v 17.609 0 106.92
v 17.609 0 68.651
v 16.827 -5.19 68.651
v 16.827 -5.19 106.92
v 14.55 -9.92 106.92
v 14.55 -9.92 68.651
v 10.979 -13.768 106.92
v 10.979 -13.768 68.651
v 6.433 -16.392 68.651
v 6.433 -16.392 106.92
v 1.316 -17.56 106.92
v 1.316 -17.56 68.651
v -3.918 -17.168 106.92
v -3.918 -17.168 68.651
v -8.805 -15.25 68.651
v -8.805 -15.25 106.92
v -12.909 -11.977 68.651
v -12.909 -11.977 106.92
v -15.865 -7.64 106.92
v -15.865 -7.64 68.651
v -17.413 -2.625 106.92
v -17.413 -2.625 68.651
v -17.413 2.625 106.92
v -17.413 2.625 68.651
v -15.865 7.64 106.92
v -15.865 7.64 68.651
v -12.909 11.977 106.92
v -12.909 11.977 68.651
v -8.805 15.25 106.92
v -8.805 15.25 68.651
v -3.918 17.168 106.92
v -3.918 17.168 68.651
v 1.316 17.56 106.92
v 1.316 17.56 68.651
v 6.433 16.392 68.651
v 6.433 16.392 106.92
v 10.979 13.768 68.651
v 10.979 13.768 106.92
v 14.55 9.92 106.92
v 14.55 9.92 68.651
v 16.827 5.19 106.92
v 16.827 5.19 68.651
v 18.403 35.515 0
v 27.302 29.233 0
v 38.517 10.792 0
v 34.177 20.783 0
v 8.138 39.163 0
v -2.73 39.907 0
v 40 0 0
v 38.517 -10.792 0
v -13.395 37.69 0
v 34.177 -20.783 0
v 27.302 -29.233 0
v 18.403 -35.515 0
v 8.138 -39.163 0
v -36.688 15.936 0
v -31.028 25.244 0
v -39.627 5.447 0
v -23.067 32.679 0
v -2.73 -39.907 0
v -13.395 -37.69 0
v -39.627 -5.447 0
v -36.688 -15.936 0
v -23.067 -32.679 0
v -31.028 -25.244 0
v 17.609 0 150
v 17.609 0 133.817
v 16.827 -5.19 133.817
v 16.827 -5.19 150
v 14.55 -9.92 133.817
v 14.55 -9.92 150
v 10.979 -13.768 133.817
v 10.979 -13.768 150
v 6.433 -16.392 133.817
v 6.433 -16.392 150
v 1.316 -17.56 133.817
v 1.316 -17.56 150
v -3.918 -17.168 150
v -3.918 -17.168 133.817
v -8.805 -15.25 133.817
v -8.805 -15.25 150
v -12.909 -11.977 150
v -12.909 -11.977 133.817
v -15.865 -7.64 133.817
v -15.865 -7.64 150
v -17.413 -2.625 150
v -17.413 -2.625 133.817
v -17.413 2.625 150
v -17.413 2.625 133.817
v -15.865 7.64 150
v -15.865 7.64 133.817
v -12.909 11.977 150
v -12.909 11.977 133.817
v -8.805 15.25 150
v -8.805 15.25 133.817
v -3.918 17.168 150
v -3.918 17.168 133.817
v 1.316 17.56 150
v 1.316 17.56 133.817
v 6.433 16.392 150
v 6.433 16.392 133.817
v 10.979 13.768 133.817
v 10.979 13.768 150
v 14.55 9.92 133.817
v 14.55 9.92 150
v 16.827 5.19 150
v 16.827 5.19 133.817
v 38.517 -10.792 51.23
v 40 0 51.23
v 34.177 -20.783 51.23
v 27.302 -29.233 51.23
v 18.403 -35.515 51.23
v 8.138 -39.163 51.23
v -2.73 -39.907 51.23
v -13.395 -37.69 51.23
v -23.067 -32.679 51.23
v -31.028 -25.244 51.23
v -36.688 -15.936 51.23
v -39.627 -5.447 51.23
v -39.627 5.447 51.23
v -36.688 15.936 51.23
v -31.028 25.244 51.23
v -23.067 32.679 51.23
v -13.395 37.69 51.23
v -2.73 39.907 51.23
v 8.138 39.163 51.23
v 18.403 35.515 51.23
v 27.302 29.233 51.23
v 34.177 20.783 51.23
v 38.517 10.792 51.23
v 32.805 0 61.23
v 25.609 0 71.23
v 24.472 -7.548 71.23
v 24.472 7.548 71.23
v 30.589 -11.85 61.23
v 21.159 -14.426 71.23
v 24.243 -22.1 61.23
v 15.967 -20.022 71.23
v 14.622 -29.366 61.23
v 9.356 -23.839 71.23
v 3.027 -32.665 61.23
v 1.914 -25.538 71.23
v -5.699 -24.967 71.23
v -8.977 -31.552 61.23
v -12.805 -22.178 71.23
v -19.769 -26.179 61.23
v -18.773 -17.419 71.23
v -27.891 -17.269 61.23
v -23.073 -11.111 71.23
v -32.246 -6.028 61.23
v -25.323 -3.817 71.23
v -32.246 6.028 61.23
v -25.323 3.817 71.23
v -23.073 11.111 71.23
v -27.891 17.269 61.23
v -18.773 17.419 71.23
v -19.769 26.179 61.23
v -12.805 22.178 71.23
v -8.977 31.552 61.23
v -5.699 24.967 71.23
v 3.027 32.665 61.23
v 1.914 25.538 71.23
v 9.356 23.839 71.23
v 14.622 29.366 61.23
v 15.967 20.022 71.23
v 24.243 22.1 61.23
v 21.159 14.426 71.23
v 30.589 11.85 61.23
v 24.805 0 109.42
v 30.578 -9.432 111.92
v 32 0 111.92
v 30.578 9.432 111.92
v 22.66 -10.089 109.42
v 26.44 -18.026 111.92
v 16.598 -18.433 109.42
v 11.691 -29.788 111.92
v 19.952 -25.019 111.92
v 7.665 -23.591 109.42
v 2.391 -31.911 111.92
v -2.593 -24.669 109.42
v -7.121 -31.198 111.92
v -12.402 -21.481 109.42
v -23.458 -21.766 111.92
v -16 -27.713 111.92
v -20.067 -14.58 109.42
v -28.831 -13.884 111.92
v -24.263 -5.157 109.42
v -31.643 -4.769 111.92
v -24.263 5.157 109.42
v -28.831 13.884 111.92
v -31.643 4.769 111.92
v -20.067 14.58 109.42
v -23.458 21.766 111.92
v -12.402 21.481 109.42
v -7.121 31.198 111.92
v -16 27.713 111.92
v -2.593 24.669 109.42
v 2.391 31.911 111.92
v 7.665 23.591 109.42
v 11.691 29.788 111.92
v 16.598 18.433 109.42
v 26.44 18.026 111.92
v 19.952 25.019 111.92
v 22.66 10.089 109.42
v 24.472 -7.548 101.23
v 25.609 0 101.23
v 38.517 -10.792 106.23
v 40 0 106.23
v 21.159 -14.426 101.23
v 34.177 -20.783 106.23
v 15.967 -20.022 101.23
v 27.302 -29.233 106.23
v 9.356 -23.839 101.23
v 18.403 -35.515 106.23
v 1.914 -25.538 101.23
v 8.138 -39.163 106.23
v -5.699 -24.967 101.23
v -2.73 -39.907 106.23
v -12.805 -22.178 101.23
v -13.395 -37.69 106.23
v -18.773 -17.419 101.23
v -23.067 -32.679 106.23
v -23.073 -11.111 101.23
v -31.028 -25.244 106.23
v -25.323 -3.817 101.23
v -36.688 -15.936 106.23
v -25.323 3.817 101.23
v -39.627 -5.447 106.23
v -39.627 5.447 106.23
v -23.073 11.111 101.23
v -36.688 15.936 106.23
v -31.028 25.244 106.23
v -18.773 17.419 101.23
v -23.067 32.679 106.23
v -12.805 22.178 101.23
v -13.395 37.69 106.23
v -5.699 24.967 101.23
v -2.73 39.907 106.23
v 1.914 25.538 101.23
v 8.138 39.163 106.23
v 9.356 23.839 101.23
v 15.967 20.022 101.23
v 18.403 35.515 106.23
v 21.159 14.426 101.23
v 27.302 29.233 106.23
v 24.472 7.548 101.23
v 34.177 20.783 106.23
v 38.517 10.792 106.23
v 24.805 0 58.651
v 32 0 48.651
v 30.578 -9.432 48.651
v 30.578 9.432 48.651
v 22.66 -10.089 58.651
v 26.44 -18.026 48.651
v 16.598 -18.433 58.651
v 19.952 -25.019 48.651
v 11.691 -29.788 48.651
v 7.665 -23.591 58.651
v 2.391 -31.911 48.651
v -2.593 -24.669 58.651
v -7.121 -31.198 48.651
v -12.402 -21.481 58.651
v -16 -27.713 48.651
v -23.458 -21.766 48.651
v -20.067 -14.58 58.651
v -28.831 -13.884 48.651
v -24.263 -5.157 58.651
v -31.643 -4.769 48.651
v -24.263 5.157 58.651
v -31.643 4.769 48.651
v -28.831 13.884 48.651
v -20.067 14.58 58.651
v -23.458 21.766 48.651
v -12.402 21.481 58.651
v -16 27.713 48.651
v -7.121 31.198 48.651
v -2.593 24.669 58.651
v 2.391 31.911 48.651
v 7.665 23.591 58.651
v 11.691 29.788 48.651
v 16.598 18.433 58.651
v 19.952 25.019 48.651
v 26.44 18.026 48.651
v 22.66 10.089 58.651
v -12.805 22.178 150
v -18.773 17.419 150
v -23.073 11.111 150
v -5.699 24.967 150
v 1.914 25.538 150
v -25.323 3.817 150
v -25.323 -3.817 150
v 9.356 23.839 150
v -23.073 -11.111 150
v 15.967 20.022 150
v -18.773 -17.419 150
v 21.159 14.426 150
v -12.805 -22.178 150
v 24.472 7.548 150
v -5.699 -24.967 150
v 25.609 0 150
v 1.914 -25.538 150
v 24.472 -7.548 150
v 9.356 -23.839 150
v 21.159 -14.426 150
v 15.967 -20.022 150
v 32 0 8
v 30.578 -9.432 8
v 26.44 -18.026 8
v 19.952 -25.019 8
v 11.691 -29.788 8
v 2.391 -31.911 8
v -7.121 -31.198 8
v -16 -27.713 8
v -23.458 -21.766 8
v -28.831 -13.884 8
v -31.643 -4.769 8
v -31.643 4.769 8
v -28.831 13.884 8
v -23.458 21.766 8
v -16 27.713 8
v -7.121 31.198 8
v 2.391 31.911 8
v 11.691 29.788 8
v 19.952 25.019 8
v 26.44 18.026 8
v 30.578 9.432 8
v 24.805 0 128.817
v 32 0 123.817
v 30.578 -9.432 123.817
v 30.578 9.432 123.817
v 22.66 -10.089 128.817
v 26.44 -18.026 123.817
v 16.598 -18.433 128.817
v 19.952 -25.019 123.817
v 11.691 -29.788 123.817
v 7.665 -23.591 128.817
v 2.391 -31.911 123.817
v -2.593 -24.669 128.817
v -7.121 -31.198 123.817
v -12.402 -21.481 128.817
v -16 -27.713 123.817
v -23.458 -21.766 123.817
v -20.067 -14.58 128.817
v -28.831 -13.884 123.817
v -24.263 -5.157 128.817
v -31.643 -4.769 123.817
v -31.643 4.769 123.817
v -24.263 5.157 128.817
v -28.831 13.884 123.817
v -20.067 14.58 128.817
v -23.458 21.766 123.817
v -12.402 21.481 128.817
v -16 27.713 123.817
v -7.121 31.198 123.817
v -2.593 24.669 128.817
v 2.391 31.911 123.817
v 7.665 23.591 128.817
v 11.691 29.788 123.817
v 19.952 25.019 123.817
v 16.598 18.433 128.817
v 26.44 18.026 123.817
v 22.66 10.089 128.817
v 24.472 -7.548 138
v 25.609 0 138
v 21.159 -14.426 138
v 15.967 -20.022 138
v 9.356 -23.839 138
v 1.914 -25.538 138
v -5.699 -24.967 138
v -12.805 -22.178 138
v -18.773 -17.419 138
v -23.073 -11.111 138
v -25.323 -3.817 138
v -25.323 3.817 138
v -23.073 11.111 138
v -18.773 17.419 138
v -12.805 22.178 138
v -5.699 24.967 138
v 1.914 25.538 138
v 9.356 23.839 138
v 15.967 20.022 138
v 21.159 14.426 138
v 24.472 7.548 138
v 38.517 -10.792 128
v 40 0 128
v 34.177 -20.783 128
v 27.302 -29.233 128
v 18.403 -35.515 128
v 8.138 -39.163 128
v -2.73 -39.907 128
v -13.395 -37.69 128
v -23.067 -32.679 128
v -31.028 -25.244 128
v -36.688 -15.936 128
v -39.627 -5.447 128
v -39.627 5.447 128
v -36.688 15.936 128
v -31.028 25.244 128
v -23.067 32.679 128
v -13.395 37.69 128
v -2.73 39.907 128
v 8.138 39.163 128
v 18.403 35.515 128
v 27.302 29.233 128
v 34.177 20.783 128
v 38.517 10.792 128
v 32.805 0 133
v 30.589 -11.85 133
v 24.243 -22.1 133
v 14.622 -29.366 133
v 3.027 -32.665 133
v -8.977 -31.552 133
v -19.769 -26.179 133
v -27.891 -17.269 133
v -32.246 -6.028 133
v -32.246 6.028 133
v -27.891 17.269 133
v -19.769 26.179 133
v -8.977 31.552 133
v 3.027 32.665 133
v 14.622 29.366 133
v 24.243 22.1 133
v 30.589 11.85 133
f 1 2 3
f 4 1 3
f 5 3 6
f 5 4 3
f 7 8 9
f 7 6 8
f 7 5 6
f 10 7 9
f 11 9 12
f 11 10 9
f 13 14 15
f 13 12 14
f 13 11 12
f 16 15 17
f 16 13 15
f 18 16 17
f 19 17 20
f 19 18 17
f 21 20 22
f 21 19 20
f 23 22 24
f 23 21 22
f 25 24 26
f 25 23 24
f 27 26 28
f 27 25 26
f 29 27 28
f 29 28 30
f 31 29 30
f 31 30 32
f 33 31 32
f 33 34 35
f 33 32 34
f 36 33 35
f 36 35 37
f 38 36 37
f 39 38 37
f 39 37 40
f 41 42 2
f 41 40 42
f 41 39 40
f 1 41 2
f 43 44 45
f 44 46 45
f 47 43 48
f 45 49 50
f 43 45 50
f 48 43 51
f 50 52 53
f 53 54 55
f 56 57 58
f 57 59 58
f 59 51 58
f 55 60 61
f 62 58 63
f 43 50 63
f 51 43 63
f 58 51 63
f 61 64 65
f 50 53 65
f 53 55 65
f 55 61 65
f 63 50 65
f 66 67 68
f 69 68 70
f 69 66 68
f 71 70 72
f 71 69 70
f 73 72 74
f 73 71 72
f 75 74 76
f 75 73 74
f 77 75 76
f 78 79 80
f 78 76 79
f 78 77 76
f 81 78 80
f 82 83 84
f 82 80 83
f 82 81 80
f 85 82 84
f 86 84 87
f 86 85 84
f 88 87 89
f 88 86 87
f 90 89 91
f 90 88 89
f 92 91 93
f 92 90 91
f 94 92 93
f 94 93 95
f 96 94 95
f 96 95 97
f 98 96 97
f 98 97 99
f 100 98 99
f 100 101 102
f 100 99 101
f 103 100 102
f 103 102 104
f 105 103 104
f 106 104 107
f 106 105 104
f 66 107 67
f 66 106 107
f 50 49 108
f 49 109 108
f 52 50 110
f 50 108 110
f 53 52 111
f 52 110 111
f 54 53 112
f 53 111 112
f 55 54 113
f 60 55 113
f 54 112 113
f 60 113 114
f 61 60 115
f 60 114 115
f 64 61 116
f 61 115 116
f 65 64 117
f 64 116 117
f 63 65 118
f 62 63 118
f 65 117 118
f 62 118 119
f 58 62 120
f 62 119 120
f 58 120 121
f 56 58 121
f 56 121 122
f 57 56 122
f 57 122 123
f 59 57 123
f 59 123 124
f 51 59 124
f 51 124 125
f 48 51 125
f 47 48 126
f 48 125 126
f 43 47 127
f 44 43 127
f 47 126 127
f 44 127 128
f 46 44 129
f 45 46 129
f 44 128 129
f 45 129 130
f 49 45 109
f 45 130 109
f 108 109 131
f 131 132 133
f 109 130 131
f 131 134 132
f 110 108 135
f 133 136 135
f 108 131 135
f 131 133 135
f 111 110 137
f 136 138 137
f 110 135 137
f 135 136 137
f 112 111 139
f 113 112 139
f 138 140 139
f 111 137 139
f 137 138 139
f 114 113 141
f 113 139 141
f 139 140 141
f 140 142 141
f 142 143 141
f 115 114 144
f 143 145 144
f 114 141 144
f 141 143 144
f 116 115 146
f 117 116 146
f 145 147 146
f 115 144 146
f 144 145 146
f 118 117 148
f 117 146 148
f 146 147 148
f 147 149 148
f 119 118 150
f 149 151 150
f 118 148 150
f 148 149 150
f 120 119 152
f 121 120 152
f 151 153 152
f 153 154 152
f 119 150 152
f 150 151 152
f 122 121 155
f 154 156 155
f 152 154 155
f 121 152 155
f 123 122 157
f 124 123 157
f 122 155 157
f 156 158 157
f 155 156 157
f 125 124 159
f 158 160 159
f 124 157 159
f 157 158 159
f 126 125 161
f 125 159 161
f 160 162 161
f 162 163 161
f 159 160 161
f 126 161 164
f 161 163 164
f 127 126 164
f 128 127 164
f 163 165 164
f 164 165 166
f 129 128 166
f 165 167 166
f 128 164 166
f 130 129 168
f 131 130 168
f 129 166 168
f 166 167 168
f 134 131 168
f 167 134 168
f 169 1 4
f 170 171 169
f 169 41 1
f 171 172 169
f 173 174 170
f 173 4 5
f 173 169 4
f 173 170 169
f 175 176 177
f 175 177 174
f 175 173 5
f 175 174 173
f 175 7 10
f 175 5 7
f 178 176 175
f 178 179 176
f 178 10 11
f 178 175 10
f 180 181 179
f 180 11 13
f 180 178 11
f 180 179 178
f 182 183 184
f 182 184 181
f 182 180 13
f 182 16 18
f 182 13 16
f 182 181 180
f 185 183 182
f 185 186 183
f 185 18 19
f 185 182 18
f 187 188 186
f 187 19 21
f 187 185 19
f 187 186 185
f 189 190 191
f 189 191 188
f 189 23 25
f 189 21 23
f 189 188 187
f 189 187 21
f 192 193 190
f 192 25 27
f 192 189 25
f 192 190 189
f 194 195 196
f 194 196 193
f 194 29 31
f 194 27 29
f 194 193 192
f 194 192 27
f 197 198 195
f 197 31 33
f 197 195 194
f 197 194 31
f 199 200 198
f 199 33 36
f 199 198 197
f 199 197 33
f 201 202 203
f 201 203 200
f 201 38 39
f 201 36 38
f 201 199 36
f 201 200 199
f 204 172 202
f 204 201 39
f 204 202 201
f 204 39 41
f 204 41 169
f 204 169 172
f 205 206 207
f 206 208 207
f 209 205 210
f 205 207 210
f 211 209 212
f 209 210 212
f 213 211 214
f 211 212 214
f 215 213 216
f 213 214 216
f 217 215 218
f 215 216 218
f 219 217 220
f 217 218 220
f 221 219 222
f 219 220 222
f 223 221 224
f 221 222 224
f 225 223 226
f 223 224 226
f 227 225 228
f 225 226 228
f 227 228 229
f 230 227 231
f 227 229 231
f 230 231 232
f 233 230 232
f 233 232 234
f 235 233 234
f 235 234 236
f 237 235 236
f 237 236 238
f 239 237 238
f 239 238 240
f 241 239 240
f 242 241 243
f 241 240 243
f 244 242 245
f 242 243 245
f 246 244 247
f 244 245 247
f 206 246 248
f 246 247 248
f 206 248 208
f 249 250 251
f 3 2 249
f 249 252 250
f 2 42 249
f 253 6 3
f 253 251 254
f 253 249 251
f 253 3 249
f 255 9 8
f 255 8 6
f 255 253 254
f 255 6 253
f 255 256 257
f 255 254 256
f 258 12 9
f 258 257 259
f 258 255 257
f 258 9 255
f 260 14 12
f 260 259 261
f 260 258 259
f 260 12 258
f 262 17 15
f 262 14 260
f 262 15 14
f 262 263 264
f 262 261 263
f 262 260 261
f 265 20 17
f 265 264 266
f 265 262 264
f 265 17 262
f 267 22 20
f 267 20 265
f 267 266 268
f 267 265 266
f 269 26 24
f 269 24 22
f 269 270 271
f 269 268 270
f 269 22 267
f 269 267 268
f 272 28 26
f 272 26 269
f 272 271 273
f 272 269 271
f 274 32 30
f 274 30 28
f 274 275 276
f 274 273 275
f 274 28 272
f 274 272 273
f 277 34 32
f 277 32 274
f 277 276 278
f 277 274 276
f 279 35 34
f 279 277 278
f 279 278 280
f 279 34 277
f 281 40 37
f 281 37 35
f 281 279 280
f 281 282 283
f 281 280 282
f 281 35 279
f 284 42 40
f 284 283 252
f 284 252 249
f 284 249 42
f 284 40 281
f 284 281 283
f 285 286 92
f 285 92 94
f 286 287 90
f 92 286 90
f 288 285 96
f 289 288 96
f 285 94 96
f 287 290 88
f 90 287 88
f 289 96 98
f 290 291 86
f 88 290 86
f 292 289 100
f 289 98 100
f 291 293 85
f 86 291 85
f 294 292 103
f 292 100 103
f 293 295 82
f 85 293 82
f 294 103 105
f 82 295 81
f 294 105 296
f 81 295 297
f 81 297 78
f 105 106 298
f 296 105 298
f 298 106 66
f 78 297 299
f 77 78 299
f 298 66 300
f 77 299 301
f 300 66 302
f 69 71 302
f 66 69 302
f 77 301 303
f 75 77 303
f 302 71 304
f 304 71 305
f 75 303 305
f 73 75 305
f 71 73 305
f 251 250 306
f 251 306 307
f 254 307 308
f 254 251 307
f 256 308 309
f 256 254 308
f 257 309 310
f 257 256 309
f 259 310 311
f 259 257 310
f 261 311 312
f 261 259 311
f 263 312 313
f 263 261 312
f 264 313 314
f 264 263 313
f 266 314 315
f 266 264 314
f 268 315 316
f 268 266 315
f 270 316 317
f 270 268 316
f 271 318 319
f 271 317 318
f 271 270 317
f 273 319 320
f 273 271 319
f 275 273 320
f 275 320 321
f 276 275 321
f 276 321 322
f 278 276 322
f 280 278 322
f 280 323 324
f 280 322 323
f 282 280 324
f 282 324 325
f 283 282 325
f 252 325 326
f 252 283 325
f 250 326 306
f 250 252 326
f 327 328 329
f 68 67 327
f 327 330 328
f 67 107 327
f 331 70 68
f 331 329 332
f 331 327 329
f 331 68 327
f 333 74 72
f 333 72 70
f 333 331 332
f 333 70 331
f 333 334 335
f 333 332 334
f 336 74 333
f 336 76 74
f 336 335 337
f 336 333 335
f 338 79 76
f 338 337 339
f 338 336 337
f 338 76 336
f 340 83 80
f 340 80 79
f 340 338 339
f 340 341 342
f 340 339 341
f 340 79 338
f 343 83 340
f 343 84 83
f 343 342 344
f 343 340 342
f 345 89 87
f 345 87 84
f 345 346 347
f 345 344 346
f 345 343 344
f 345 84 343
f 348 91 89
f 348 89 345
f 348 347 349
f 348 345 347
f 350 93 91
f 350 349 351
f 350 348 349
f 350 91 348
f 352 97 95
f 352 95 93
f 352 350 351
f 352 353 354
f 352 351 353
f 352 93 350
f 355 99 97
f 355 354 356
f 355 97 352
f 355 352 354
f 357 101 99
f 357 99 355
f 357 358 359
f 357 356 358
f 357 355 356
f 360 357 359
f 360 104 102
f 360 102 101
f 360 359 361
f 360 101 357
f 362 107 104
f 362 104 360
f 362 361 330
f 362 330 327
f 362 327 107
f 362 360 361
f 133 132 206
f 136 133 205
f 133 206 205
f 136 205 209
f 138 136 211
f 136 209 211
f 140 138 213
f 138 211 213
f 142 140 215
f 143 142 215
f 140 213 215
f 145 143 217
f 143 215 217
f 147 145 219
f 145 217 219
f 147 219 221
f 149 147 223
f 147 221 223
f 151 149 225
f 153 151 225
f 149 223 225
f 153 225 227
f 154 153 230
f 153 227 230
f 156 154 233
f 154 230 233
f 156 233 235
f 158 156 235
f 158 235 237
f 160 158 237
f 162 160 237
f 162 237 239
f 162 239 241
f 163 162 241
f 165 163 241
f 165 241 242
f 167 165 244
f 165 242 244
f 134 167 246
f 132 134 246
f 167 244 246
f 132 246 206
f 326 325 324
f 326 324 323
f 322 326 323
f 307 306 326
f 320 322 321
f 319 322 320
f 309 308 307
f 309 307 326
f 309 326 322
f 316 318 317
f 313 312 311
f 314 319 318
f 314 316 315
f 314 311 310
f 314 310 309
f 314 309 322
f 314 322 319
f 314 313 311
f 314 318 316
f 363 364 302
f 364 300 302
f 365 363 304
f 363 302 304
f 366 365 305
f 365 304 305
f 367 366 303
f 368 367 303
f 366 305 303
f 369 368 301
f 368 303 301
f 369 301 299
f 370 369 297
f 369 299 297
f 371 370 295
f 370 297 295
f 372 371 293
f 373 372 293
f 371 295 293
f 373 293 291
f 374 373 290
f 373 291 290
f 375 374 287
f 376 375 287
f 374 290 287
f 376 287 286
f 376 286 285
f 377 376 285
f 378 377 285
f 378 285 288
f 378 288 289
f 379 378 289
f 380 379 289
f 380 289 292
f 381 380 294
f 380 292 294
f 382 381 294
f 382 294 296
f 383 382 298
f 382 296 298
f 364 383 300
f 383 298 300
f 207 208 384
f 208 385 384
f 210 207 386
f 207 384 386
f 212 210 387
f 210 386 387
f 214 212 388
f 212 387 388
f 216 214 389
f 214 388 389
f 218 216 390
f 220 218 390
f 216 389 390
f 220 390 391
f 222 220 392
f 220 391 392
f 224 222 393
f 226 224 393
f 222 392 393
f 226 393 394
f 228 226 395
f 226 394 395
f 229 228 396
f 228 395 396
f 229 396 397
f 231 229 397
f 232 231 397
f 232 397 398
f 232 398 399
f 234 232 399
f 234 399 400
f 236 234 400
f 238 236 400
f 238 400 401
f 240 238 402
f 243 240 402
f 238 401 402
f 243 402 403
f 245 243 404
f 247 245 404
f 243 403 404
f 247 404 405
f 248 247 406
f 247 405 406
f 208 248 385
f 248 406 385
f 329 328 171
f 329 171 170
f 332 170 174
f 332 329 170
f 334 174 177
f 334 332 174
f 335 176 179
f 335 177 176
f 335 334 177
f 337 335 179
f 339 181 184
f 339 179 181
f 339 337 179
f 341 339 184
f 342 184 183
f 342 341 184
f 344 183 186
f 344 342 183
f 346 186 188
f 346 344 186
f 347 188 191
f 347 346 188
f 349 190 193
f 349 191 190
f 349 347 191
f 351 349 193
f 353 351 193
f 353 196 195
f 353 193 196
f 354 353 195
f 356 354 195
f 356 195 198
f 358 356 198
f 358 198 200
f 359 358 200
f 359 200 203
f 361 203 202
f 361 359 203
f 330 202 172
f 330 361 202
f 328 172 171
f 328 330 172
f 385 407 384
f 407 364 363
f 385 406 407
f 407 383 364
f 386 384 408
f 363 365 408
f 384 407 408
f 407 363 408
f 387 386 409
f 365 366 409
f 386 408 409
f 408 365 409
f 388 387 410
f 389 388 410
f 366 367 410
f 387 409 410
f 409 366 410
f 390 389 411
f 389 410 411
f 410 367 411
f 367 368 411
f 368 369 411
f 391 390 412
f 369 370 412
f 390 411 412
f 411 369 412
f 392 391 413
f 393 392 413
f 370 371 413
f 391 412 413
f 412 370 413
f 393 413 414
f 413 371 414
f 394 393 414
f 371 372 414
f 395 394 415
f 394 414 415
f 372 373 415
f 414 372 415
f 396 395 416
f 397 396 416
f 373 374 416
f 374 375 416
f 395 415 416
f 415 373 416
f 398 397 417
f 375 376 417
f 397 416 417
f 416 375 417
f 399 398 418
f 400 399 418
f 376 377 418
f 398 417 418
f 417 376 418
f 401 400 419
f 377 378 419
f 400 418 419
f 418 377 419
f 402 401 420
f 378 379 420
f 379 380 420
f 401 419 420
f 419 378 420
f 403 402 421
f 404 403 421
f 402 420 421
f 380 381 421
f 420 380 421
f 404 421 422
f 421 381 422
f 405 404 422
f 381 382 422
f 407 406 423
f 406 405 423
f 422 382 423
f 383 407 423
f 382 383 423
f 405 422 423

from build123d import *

# Parameters (mm, degrees)
F2_T = -8


with BuildPart() as f1:
    # F0 (on Front) → F1 (revolve)
    with BuildSketch(Plane.XZ):
        Polygon((0, 150), (0, 0), (40, 0), (40, 51.2300857674), (25.6093478629, 71.2300857674), (25.6093478629, 101.2300857674), (40, 106.2300857674), (40, 128), (25.6093478629, 138), (25.6093478629, 150), align=None)
    revolve(axis=Axis((0, 0, 75), (0, 0, -1)))

    # F2
    f2_openings = [f1.faces().sort_by_distance(p)[0] for p in [
        (0, 0, 150),
    ]]
    offset(amount=F2_T, openings=f2_openings, kind=Kind.INTERSECTION)


solid = f1.part
